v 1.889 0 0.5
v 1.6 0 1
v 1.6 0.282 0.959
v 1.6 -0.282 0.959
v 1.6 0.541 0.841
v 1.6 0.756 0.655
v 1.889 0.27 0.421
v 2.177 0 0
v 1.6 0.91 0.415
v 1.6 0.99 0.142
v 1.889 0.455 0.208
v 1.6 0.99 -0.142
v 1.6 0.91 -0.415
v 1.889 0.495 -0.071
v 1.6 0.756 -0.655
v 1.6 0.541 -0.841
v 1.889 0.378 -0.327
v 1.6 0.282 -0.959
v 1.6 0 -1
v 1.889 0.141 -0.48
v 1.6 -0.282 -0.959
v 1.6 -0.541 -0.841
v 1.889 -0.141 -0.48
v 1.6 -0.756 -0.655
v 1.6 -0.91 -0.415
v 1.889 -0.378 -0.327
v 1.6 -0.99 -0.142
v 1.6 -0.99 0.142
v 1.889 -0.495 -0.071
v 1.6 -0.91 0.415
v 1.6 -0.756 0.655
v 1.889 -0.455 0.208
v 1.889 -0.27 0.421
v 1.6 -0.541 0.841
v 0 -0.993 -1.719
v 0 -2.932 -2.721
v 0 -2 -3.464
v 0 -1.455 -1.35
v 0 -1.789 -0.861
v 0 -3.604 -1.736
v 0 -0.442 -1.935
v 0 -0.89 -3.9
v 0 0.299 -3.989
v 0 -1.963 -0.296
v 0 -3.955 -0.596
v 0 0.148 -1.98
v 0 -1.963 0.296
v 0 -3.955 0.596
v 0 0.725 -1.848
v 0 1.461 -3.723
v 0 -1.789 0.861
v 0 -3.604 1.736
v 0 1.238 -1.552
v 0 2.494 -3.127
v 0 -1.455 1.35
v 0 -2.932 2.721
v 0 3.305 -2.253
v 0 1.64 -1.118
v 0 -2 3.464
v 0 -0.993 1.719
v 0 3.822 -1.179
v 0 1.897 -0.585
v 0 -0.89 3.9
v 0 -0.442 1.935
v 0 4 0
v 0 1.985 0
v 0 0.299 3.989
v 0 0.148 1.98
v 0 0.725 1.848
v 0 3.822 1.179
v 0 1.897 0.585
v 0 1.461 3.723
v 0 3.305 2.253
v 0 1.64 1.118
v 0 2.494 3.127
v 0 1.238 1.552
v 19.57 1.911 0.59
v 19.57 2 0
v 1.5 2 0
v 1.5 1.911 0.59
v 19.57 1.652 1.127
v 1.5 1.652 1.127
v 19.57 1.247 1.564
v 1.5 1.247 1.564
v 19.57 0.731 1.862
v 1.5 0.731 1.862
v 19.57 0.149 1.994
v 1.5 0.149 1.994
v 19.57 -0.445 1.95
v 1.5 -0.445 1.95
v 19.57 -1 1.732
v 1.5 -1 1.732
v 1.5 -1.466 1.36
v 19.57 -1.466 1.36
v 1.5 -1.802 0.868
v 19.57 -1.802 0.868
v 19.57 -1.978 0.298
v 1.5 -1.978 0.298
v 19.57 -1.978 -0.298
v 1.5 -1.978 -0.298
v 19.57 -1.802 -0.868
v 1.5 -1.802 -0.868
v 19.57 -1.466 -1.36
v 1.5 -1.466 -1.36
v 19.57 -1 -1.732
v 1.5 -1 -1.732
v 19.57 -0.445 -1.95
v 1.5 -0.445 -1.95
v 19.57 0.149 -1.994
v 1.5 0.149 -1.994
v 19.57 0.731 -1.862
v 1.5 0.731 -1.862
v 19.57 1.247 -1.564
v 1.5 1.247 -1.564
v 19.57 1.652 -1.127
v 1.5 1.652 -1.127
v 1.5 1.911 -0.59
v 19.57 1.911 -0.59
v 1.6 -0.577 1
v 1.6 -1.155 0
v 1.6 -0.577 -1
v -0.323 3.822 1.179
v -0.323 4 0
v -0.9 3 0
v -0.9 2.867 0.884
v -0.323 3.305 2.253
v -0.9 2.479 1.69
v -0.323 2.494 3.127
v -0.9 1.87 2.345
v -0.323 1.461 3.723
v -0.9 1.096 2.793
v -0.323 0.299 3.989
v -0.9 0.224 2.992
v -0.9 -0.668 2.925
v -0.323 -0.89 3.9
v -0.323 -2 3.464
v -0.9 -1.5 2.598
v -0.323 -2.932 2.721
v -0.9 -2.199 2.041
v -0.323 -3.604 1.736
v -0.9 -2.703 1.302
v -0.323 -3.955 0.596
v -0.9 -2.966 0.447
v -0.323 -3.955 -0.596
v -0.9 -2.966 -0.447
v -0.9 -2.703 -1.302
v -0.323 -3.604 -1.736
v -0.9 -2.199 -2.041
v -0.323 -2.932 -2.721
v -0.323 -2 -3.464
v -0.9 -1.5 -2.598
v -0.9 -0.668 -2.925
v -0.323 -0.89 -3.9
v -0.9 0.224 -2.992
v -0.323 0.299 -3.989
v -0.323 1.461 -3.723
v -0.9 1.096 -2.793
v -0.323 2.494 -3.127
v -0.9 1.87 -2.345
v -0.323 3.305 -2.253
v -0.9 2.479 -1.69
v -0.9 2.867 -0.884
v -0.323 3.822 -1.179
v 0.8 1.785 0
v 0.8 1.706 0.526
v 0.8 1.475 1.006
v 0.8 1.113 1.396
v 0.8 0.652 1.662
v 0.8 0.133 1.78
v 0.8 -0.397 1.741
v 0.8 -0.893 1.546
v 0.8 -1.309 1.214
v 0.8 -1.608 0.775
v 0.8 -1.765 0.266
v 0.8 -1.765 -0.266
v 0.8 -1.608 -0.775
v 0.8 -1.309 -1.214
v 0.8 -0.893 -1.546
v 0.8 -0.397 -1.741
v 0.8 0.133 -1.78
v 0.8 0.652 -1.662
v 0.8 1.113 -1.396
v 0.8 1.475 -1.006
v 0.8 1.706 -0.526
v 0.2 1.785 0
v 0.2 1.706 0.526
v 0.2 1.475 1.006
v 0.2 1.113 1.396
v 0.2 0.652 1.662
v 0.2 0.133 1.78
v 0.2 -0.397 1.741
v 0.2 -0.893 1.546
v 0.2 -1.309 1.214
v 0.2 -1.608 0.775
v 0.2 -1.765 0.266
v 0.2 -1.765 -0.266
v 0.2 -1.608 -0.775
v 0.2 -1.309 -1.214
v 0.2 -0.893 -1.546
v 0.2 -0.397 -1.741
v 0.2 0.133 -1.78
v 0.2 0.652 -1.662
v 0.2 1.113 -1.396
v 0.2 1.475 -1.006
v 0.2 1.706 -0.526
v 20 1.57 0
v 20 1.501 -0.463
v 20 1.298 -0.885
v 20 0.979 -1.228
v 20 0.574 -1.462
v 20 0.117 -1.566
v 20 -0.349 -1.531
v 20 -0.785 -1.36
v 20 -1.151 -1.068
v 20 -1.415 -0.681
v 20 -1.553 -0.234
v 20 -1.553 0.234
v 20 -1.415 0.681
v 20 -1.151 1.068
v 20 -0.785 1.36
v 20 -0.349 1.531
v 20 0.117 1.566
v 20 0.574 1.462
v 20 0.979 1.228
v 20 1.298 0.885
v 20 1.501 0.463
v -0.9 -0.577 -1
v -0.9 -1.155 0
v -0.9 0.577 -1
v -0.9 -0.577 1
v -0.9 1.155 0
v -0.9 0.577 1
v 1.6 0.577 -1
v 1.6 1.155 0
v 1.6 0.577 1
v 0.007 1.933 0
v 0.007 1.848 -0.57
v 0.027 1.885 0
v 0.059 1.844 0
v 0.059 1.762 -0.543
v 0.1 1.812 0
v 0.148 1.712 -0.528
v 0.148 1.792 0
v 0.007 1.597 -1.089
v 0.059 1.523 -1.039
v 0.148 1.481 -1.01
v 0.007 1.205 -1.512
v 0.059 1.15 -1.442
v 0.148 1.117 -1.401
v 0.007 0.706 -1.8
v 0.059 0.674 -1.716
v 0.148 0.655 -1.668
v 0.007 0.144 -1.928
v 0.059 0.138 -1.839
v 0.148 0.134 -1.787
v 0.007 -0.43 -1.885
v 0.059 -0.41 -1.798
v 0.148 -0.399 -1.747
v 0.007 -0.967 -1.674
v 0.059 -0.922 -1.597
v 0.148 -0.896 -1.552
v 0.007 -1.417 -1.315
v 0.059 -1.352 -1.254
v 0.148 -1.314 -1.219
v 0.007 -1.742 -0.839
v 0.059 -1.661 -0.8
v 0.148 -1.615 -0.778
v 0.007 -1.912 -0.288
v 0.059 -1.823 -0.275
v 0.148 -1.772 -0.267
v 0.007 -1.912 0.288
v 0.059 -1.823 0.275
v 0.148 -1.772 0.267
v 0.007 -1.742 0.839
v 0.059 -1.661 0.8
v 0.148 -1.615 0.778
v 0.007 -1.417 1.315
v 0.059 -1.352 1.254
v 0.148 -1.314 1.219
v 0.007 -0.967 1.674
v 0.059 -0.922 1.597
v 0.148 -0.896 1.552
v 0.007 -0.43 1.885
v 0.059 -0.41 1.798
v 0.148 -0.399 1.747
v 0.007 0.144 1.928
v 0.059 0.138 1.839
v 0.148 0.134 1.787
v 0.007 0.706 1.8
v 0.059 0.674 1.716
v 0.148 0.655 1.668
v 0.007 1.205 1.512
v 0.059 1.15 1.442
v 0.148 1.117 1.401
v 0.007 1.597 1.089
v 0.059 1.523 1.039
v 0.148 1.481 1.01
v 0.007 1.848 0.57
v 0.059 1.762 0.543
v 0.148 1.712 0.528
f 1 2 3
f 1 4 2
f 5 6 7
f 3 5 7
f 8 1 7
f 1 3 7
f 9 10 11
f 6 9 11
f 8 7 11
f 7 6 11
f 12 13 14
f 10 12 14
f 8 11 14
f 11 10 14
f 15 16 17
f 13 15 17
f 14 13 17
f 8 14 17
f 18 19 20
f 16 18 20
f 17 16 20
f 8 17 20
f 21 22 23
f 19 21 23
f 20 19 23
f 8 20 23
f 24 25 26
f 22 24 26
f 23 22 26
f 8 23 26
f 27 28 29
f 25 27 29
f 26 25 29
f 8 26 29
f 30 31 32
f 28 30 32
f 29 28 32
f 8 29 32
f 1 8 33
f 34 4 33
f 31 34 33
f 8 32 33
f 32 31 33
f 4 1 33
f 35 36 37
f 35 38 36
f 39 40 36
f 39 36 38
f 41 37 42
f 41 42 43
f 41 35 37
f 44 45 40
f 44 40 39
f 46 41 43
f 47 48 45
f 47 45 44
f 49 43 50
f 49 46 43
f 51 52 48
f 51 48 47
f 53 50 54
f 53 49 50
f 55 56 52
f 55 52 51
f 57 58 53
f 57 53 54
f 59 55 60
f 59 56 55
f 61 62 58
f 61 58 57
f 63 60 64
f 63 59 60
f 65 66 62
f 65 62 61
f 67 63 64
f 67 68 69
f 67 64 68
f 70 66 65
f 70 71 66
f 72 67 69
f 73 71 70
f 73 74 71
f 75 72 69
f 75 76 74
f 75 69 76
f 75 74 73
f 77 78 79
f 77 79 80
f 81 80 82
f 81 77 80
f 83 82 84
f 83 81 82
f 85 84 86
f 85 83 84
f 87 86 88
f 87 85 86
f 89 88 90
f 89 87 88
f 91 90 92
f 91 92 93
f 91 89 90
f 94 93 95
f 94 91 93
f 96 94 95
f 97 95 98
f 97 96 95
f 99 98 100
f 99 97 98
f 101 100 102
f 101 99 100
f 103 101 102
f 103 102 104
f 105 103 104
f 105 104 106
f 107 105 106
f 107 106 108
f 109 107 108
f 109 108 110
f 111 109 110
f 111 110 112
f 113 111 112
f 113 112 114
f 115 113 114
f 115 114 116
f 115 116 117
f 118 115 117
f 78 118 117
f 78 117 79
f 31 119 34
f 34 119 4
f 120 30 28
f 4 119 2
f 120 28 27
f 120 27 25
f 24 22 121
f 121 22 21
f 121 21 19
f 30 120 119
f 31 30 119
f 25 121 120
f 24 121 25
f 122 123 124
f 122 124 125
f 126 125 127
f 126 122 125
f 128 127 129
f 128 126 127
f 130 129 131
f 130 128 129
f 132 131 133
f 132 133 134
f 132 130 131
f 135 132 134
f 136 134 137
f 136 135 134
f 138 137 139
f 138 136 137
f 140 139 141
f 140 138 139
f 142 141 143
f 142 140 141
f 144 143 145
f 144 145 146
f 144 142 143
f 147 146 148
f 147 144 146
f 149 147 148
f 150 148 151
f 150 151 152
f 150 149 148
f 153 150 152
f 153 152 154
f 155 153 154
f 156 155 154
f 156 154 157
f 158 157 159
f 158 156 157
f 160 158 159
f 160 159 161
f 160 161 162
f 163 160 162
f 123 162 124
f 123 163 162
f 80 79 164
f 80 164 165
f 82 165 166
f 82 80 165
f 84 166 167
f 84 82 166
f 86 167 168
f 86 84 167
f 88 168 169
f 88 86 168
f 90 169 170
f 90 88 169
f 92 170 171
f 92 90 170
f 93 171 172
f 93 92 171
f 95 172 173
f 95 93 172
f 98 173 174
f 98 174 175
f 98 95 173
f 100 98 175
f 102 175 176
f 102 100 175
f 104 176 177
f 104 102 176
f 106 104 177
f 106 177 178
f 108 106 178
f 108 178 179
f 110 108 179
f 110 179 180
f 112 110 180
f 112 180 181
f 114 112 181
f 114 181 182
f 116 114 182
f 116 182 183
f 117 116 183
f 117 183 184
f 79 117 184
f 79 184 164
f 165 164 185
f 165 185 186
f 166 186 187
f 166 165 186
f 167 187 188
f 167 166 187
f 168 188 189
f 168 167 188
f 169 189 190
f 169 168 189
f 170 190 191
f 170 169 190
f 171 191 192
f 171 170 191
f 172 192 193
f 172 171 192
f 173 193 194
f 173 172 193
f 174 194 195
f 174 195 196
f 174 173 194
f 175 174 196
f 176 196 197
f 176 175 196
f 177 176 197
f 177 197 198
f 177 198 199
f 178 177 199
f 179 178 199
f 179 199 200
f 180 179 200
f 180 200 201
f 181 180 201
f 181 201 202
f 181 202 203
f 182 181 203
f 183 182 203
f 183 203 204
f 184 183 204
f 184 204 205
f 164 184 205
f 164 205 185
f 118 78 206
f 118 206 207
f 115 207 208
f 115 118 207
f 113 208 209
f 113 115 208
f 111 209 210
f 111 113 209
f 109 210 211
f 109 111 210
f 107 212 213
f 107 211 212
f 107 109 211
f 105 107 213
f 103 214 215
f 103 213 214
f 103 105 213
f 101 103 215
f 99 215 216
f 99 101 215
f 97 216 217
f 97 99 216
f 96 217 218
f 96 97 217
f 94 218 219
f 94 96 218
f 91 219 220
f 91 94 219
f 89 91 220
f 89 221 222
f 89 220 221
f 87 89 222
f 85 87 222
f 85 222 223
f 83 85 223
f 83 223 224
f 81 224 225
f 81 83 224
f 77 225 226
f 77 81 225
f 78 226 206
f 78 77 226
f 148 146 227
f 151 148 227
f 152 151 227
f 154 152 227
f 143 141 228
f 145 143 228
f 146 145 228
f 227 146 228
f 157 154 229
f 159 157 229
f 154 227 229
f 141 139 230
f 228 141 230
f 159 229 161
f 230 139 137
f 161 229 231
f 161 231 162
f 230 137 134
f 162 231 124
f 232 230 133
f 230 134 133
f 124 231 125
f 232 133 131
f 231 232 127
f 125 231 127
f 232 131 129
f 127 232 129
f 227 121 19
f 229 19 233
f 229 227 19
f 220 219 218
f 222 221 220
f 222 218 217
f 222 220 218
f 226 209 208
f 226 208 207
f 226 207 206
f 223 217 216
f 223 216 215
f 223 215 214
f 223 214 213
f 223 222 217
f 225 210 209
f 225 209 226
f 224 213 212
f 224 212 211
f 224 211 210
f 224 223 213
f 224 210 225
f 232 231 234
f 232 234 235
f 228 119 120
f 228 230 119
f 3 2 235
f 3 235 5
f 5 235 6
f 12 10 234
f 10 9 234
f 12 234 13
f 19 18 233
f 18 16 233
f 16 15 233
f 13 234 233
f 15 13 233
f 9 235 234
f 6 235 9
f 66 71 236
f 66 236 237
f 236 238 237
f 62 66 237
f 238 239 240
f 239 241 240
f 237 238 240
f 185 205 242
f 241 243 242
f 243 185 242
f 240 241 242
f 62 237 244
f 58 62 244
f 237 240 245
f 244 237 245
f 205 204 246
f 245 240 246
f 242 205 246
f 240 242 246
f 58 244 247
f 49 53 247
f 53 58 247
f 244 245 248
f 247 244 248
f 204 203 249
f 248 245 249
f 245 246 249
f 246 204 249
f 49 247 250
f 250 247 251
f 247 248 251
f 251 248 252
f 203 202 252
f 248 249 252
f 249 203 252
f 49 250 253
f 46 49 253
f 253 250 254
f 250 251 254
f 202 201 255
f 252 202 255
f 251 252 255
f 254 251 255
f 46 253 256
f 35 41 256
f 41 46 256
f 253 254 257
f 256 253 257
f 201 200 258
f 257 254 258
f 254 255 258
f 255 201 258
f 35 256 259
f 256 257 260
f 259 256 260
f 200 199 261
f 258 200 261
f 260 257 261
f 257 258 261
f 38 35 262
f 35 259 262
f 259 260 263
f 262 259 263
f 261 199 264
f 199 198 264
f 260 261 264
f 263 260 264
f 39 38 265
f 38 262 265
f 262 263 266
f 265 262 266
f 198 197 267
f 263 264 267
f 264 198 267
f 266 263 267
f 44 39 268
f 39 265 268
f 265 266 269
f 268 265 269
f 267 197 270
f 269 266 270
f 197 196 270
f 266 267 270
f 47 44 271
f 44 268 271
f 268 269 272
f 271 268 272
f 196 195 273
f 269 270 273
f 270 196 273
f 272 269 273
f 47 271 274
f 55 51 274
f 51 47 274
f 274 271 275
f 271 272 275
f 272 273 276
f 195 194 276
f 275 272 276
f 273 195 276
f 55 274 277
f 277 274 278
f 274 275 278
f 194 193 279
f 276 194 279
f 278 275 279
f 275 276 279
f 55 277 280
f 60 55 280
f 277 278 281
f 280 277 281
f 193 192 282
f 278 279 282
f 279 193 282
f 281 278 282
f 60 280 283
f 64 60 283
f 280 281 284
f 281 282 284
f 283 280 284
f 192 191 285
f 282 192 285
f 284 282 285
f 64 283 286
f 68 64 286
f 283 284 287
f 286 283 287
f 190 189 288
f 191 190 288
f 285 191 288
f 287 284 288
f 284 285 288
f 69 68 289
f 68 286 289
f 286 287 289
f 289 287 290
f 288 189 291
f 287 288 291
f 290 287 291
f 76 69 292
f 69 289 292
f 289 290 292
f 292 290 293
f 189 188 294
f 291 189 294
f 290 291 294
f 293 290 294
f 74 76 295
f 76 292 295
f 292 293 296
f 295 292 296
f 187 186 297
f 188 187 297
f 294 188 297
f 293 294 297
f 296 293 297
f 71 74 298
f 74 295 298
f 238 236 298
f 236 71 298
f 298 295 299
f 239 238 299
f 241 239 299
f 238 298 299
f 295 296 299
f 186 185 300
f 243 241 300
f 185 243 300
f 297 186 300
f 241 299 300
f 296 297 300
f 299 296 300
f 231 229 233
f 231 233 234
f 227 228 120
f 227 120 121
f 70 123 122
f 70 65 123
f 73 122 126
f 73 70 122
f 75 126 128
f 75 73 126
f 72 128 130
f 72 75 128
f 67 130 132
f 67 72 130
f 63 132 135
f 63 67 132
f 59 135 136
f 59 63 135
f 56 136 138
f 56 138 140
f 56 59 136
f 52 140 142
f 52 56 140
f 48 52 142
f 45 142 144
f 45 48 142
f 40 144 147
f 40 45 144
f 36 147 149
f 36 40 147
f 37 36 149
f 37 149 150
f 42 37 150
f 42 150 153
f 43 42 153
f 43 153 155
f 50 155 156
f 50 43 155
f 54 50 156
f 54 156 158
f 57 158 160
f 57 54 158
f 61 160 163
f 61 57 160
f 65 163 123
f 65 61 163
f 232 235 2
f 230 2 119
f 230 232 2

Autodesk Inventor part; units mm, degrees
ref_plane "YZ Plane" through (0, 0, 0) normal (1, 0, 0) x (0, 1, 0)
ref_plane "XZ Plane" through (0, 0, 0) normal (0, 1, 0) x (-1, 0, 0)
ref_plane "XY Plane" through (0, 0, 0) normal (0, 0, 1) x (1, 0, 0)
sketch "Sketch_1" plane through (0, 0, 0) normal (0, 0, 1) x (1, 0, 0)
  line L0 (20, 0) -> (-0.9, 0)
  line L1 (-0.9, 0) -> (-0.9, 3)
  line L2 (-0.9, 3) -> (-0.3226, 4)
  line L3 (-0.3226, 4) -> (0, 4)
  line L4 (0, 4) -> (0, 1.9852)
  arc A0 (0, 1.9852) -> (0.2, 1.7853) centre (0.2, 1.9853) ccw
  line L5 (0.2, 1.7853) -> (0.8, 1.7853)
  line L6 (0.8, 1.7853) -> (1.5, 2)
  line L7 (1.5, 2) -> (19.5705, 2)
  line L8 (19.5705, 2) -> (20, 1.5705)
  line L9 (20, 1.5705) -> (20, 0)
  line L10 (20, 0) -> (-0.9, 0)
revolve "Revolution1" add sketch "Sketch_1" angle 360 about axis through (20, 0, 0) along (1, 0, 0)
thread "Thread1" size "M4x0.7" class "6g" standard "ISO Metric profile" full length
sketch "Sketch2" plane through (-0.9, 0, 0) normal (-1, 0, 0) x (0, 0, 1)
  point P0 (0, 0)
hole "Hole1" at (-0.9, 0, 0) direction (1, 0, 0) diameter 2 depth 2.5 tip angle 120
sketch "Sketch_3" plane through (-0.9, 0, 0) normal (1, 0, 0) x (0, 0, -1)
  line L0 (-1, -0.5774) -> (0, -1.1547)
  line L1 (0, -1.1547) -> (1, -0.5774)
  line L2 (1, -0.5774) -> (1, 0.5774)
  line L3 (1, 0.5774) -> (0, 1.1547)
  line L4 (0, 1.1547) -> (-1, 0.5774)
  line L5 (-1, 0.5774) -> (-1, -0.5774)
extrude "Extrusion1" cut sketch "Sketch_3" along normal blind 2.5
properties part number "CBSTSR4-20"
